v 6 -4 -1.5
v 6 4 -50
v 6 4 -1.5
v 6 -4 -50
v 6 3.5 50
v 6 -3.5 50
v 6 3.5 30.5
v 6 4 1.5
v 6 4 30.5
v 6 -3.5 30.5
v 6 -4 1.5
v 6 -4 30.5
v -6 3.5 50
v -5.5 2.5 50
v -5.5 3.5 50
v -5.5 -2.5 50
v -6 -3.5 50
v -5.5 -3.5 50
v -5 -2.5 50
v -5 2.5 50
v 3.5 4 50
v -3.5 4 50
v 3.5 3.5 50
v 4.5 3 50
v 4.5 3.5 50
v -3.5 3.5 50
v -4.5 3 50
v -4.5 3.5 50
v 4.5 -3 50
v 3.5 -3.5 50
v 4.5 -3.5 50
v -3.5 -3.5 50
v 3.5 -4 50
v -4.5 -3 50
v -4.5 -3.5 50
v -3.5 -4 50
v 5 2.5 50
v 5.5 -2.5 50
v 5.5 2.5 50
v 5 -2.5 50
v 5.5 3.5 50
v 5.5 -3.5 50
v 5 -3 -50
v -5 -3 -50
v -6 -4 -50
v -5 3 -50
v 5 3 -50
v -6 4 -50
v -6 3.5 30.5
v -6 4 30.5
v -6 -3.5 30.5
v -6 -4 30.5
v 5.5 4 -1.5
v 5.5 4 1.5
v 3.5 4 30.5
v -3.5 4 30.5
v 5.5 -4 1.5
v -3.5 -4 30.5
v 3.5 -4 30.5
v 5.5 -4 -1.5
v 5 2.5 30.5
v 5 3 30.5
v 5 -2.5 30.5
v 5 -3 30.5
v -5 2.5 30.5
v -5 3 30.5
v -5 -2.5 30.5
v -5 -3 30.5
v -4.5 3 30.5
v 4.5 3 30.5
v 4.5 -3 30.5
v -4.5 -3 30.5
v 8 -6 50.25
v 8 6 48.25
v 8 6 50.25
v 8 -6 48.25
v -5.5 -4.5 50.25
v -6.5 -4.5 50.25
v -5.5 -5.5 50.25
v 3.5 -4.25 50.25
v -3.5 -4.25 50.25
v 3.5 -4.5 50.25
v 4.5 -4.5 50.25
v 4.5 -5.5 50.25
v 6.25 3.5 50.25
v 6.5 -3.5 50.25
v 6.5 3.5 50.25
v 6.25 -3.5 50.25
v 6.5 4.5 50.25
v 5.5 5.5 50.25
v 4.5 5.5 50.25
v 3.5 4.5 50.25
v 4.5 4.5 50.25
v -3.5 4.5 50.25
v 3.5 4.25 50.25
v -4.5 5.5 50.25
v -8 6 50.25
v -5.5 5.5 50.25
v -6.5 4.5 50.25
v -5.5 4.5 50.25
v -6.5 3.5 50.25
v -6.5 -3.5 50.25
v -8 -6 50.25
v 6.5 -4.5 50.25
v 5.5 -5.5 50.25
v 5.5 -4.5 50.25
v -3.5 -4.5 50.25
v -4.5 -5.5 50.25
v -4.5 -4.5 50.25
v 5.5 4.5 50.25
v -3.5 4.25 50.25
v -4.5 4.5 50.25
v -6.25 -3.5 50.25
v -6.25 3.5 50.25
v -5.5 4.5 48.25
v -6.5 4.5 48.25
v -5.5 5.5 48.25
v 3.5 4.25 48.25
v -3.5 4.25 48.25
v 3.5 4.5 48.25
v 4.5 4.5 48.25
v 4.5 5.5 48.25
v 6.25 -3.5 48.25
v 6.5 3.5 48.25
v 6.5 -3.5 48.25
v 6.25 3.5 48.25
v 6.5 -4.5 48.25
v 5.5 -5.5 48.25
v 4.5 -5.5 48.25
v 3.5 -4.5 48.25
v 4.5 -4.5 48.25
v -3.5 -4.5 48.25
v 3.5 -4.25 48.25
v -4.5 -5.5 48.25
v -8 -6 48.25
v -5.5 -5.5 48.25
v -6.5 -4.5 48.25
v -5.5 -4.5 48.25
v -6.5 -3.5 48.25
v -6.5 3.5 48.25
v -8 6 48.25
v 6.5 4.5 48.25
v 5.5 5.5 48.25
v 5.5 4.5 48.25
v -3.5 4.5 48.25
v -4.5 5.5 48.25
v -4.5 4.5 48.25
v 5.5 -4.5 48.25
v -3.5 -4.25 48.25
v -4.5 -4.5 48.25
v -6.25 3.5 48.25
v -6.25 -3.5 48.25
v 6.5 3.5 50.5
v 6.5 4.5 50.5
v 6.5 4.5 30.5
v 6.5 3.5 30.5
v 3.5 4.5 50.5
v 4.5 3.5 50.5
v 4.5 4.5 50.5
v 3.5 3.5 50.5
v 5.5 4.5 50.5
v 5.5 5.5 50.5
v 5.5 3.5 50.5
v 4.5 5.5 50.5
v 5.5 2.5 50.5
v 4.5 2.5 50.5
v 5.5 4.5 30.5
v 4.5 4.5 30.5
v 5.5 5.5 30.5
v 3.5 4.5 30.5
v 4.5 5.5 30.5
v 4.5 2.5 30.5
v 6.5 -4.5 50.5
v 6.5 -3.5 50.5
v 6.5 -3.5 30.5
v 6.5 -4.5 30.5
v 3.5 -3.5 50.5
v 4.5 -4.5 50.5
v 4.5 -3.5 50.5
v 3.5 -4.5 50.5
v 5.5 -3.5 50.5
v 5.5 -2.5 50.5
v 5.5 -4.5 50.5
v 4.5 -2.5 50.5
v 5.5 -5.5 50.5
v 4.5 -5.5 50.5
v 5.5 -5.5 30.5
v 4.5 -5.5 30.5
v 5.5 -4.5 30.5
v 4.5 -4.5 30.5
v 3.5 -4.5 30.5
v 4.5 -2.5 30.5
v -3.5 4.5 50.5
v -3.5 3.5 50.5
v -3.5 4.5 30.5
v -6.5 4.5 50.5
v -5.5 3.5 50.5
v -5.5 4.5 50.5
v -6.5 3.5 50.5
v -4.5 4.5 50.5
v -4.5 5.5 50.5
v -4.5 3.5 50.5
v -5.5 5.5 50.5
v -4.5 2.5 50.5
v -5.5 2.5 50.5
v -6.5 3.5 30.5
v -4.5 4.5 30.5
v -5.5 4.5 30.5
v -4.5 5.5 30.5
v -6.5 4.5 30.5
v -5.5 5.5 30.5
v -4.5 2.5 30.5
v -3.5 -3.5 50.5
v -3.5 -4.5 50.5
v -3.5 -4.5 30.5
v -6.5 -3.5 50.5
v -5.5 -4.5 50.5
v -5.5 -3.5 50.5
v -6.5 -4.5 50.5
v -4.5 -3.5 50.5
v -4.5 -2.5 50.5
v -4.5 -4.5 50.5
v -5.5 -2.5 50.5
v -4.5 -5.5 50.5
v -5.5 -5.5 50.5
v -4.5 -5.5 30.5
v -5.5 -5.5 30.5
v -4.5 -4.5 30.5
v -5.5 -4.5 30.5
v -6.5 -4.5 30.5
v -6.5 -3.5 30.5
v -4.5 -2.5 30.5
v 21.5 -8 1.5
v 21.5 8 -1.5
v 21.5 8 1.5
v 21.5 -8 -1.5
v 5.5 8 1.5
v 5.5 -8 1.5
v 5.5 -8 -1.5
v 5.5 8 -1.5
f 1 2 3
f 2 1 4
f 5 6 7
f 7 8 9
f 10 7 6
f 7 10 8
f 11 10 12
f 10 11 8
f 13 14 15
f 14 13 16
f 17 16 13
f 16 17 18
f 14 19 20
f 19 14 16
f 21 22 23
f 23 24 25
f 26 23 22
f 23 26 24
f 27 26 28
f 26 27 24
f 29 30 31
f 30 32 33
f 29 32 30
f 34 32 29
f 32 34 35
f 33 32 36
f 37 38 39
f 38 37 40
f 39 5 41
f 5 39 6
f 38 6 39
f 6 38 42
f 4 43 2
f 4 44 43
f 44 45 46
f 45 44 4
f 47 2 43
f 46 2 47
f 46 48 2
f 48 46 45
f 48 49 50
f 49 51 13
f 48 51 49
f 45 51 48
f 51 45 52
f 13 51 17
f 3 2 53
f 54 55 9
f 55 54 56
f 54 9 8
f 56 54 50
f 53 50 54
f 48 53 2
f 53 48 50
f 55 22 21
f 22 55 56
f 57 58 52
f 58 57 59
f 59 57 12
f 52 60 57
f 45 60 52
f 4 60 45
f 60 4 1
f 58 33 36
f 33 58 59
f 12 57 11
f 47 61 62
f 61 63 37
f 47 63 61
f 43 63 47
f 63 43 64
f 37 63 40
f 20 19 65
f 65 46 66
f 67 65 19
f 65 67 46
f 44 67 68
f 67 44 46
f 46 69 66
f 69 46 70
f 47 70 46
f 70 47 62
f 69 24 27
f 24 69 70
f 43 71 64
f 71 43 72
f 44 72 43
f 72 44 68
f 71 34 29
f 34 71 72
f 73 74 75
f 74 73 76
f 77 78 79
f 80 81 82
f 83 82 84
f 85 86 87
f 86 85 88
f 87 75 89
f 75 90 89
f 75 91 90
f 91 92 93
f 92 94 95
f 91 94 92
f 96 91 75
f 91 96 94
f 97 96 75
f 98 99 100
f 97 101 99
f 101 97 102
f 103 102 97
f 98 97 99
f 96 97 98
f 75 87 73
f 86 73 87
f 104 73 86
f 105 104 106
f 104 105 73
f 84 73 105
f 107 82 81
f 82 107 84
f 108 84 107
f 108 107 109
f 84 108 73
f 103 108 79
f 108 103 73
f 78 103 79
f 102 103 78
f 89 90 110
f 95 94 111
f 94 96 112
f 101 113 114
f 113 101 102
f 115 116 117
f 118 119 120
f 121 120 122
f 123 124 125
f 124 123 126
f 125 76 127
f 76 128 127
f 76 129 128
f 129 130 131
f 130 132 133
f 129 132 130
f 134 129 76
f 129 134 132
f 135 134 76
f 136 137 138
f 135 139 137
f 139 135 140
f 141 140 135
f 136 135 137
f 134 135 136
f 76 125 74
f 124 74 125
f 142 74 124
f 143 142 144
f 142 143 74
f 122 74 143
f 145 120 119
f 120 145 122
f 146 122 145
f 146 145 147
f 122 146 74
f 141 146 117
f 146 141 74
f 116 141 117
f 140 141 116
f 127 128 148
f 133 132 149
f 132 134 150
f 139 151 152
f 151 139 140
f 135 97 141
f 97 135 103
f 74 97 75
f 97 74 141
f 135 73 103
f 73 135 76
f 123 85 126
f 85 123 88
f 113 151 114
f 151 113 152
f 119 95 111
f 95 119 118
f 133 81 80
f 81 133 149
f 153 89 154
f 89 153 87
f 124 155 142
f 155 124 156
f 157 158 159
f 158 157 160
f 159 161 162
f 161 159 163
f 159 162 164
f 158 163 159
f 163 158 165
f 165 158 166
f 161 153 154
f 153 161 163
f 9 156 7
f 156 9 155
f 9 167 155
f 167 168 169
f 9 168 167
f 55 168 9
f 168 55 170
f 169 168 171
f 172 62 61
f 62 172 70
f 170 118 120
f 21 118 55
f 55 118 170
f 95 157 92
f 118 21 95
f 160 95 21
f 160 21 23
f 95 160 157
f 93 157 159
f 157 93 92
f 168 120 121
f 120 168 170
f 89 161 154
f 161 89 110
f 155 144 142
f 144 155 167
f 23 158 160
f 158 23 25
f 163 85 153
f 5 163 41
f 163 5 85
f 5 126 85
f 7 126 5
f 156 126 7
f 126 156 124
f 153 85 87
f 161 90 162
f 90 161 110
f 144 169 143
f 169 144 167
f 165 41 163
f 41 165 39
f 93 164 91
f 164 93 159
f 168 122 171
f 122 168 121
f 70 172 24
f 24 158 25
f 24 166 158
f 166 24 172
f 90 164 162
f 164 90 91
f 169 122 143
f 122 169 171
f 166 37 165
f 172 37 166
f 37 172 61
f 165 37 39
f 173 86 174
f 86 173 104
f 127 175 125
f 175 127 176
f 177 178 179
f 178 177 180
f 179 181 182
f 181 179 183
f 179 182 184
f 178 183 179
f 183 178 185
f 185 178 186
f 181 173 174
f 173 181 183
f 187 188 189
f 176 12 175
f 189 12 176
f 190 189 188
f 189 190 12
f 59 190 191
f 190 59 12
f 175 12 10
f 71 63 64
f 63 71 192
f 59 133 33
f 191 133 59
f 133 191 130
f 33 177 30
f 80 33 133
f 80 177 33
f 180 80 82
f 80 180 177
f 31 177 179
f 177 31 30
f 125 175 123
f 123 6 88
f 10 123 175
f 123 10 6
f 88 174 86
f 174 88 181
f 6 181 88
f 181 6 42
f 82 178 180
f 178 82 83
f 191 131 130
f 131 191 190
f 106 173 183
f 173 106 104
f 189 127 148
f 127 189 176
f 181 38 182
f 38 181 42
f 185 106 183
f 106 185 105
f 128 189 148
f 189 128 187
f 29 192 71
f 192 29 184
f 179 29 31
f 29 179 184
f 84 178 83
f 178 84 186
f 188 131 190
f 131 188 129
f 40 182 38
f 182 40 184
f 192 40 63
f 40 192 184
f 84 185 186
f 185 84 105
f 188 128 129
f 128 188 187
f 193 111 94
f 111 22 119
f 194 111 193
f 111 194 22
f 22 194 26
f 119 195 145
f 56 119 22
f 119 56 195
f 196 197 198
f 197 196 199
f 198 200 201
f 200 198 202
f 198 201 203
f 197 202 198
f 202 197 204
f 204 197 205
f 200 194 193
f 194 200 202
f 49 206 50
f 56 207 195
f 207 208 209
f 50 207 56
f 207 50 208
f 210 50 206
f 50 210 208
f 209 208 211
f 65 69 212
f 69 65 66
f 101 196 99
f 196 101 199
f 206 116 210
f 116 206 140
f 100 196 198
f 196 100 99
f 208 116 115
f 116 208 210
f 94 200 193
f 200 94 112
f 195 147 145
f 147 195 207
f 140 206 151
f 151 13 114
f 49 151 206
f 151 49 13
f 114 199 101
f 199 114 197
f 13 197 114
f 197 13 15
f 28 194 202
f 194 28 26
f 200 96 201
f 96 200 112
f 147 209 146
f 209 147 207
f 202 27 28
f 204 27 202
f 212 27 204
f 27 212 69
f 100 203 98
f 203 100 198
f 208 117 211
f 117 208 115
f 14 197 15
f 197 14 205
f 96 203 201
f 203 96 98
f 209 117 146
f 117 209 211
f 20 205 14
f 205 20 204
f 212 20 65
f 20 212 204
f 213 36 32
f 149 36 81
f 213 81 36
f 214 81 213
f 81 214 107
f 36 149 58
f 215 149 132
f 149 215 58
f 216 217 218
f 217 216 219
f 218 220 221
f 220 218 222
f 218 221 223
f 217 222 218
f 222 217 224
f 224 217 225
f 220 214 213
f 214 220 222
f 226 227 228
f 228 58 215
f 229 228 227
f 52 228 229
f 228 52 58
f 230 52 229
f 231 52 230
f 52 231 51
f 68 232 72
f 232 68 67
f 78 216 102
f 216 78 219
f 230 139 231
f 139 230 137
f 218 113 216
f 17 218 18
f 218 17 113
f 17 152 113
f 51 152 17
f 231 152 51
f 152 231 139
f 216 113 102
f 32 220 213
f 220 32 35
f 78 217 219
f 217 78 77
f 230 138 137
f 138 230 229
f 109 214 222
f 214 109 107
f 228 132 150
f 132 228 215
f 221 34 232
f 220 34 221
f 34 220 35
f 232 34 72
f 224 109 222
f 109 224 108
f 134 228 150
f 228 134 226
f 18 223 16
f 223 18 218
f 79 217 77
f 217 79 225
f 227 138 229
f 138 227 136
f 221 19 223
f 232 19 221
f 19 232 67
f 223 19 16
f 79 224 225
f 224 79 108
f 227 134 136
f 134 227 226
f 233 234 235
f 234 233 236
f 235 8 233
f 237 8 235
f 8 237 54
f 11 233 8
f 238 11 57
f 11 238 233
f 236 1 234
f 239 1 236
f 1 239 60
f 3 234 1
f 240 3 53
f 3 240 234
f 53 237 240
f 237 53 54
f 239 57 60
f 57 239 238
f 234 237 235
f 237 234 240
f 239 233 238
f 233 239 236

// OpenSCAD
// Parameters
outer_width_mm = 12; //[6:24:1]
outer_height_mm = 8; //[4:16:1]
wall_thickness_mm = 1; //[0.5:2:0.1]
length_mm = 100; //[50:200:1]
eps_mm = 0.5; //[0.2:2:0.1]
inner_width_mm = 10; //[4:22:1]
inner_height_mm = 6; //[2:14:1]
bezel_thickness_mm = 2; //[1:5:0.5]
bezel_outset_mm = 2; //[1:6:0.5]
corner_profile_leg_mm = 3; //[1.5:6:0.5]
corner_profile_length_mm = 20; //[10:60:1]
bracket_thickness_mm = 3; //[1.5:6:0.5]
bracket_width_mm = 16; //[8:32:1]
bracket_height_mm = 16; //[8:32:1]

// Box Section
module box_section() {
  color("Silver") difference() {
    cube([outer_width_mm, outer_height_mm, length_mm], center=true);
    translate([0, 0, 0])
      cube([inner_width_mm, inner_height_mm, length_mm + 2*eps_mm], center=true);
  }
}

// Box Bezel Section
module box_bezel_section() {
  color("DimGray") difference() {
    translate([0, 0, length_mm/2 - bezel_thickness_mm/2 + eps_mm/2])
      cube([outer_width_mm + 2*bezel_outset_mm, outer_height_mm + 2*bezel_outset_mm, bezel_thickness_mm], center=true);
    translate([0, 0, length_mm/2 - bezel_thickness_mm/2 + eps_mm/2])
      cube([outer_width_mm + eps_mm, outer_height_mm + eps_mm, bezel_thickness_mm + 2*eps_mm], center=true);
  }
}

// Box Corner Profile Section
module box_corner_profile_section() {
  color("Black") union() {
    cube([corner_profile_leg_mm, wall_thickness_mm, corner_profile_length_mm], center=true);
    cube([wall_thickness_mm, corner_profile_leg_mm, corner_profile_length_mm], center=true);
  }
}

// Box Corner Profile Sections
module box_corner_profile_sections() {
  union() {
    translate([outer_width_mm/2 - corner_profile_leg_mm/2 + eps_mm, outer_height_mm/2 - wall_thickness_mm/2 + eps_mm, length_mm/2 - corner_profile_length_mm/2 + eps_mm])
      box_corner_profile_section();
    translate([outer_width_mm/2 - corner_profile_leg_mm/2 + eps_mm, -outer_height_mm/2 + wall_thickness_mm/2 - eps_mm, length_mm/2 - corner_profile_length_mm/2 + eps_mm])
      box_corner_profile_section();
    translate([-outer_width_mm/2 + corner_profile_leg_mm/2 - eps_mm, outer_height_mm/2 - wall_thickness_mm/2 + eps_mm, length_mm/2 - corner_profile_length_mm/2 + eps_mm])
      box_corner_profile_section();
    translate([-outer_width_mm/2 + corner_profile_leg_mm/2 - eps_mm, -outer_height_mm/2 + wall_thickness_mm/2 - eps_mm, length_mm/2 - corner_profile_length_mm/2 + eps_mm])
      box_corner_profile_section();
  }
}

// Box Shelf Bracket Section
module box_shelf_bracket_section() {
  color("Silver") translate([outer_width_mm/2 + bracket_width_mm/2 - eps_mm, 0, 0]) {
    cube([bracket_width_mm, bracket_height_mm, bracket_thickness_mm], center=true);
  }
}

// Assembly
module assembly() {
  box_section();
  box_bezel_section();
  box_corner_profile_sections();
  box_shelf_bracket_section();
}

assembly();
